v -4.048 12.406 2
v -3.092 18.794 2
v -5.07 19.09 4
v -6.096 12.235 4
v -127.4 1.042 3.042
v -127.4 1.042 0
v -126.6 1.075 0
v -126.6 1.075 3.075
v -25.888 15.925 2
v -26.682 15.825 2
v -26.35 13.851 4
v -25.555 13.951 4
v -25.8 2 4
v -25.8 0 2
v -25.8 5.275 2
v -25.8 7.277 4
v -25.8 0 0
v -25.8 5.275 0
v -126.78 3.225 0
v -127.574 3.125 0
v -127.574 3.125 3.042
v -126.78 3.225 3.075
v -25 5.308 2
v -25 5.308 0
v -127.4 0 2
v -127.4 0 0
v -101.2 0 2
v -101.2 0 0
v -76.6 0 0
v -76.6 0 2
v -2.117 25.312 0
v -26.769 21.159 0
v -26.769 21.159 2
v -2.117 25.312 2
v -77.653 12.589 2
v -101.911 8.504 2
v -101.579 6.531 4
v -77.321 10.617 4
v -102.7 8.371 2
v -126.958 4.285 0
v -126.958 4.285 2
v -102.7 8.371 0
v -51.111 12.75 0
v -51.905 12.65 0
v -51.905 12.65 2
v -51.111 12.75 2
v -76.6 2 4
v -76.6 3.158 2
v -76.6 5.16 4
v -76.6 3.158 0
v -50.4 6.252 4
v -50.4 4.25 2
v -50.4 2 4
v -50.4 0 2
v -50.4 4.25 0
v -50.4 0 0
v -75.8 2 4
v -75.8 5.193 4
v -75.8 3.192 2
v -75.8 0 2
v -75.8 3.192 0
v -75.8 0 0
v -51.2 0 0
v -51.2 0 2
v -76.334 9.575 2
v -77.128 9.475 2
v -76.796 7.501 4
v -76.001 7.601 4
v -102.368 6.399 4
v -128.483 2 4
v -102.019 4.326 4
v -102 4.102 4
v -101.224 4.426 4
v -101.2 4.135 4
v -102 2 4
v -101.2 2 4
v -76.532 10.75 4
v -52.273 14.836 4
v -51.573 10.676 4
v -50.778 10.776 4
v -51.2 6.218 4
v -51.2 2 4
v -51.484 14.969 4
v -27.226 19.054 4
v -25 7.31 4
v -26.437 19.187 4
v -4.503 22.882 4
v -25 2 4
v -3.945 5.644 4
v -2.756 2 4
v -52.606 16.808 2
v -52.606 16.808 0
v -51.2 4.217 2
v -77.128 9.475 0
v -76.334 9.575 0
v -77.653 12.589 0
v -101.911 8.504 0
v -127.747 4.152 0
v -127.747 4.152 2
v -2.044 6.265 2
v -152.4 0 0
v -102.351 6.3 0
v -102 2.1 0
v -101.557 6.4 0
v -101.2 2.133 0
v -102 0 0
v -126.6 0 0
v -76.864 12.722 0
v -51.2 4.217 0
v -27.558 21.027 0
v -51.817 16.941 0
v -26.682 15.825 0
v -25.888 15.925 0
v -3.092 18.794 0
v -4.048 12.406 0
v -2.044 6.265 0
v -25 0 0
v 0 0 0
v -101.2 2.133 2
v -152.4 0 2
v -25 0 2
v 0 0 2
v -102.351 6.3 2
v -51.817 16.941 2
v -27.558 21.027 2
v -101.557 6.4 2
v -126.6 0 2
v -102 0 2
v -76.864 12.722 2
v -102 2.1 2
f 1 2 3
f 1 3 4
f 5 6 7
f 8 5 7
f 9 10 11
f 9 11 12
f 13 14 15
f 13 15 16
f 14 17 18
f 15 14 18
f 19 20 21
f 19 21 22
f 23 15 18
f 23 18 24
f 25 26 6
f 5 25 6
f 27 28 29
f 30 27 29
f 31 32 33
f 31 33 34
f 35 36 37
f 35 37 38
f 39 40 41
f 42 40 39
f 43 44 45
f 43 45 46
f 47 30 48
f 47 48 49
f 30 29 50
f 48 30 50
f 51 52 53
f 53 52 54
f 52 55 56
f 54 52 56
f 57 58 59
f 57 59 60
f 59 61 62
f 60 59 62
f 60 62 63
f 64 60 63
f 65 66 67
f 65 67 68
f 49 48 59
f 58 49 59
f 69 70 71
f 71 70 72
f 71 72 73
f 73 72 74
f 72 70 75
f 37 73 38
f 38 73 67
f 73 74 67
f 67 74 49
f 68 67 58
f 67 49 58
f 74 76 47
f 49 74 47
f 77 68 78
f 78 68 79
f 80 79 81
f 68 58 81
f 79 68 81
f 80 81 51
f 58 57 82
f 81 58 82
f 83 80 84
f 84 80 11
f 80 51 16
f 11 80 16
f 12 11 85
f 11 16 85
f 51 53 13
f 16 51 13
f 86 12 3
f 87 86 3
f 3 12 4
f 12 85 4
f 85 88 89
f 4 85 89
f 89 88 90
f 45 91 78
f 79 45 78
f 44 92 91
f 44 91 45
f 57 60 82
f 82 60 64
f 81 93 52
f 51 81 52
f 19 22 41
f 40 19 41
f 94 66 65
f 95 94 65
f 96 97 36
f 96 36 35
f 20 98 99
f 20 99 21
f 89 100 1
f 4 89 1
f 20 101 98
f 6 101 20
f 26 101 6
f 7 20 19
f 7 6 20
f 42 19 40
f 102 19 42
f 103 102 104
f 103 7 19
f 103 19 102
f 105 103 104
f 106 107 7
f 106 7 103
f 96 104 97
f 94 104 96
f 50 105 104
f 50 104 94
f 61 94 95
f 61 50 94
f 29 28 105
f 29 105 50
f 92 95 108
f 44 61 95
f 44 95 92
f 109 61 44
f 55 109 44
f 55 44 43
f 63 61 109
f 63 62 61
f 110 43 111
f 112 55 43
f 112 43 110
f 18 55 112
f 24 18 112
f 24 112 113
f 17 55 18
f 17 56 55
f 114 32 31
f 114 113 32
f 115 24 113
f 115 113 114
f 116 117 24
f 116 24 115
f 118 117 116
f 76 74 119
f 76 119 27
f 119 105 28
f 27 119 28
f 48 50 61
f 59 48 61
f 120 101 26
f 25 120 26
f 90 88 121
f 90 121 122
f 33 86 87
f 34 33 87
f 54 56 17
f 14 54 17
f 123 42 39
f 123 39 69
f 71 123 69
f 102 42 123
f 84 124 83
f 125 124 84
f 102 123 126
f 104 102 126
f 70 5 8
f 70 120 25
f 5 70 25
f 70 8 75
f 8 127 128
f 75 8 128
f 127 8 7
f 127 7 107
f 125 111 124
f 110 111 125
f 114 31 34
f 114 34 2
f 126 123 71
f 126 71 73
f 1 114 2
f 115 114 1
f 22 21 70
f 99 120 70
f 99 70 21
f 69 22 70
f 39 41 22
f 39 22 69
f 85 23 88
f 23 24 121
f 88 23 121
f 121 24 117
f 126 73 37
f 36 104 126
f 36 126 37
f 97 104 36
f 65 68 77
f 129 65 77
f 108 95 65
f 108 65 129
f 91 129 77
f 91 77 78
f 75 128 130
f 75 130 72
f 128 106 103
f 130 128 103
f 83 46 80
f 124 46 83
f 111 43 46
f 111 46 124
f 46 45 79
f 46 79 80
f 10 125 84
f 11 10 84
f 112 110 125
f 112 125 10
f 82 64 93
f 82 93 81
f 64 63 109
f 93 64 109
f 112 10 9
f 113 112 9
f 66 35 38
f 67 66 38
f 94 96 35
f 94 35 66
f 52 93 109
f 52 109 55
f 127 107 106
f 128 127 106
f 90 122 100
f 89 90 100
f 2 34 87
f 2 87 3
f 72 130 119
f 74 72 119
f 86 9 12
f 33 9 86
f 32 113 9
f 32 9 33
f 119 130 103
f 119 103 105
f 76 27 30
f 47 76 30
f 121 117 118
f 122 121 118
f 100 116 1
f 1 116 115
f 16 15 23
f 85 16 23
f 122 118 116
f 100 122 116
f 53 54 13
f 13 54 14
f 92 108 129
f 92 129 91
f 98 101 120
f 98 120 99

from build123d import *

# Parameters (mm, degrees)
F2_DEPTH    = 4
F3_C1_SIZE  = 2
F3_C2_SIZE  = 2
F3_C3_SIZE  = 2
F3_C4_SIZE  = 2
F3_C5_SIZE  = 2
F3_C6_SIZE  = 2
F3_C7_SIZE  = 2
F3_C8_SIZE  = 2
F3_C9_SIZE  = 2
F3_C10_SIZE = 2


with BuildPart() as f2:
    # F1 (on Top) → F2 (new body)
    with BuildSketch(Plane.XY):
        Polygon((-25, 0), (0, 0), (-2.0441389628, 6.2647895141), (-25, 5.3083011104), align=None)
        Polygon((-25, 5.3083011104), (-2.0441389628, 6.2647895141), (-4.0478985191, 12.4058259531), (-75.8, 6.4056137967), (-75.8, 3.1916472924), (-51.2, 4.2166410704), (-51.2, 7.6929950155), (-50.4, 7.6929950155), (-50.4, 4.2499742014), (-25.8, 5.2749679794), (-25.8, 7.6929950155), (-25, 7.6929950155), align=None)
        Polygon((-50.4, 0), (-25.8, 0), (-25.8, 5.2749679794), (-50.4, 4.2499742014), align=None)
        Polygon((-75.8, 0), (-51.2, 0), (-51.2, 4.2166410704), (-75.8, 3.1916472924), align=None)
        Polygon((-51.2, 4.2166410704), (-50.4, 4.2499742014), (-50.4, 7.6929950155), (-51.2, 7.6929950155), align=None)
        Polygon((-25.8, 5.2749679794), (-25, 5.3083011104), (-25, 7.6929950155), (-25.8, 7.6929950155), align=None)
        Polygon((-76.6, 3.1583141614), (-76.6, 6.3387144359), (-101.2, 4.2815590912), (-101.2, 2.1333203834), align=None)
        Polygon((-75.8, 3.1916472924), (-75.8, 6.4056137967), (-76.6, 6.3387144359), (-76.6, 3.1583141614), align=None)
        Polygon((-76.6, 0), (-76.6, 3.1583141614), (-101.2, 2.1333203834), (-101.2, 0), align=None)
        Polygon((-101.2, 2.1333203834), (-101.2, 4.2815590912), (-102, 4.2146597304), (-102, 2.0999872524), align=None)
        Polygon((-102, 0), (-102, 2.0999872524), (-126.6, 1.0749934745), (-126.6, 0), align=None)
        Polygon((-102, 2.0999872524), (-102, 4.2146597304), (-126.6, 2.1575043858), (-126.6, 1.0749934745), align=None)
        Polygon((-126.6, 1.0749934745), (-126.6, 2.1575043858), (-127.4, 2.090605025), (-127.4, 1.0416603435), align=None)
        Polygon((-127.4, 1.0416603435), (-127.4, 2.090605025), (-152.4, 0), align=None)
        Polygon((-127.4, 1.0416603435), (-152.4, 0), (-127.4, 0), align=None)
    extrude(amount=F2_DEPTH)

    # F3: chamfer of 2 on 11 edges, made by hand

    # F3_c1
    f3_c1_edges = [f2.edges().sort_by_distance(p)[0] for p in [
        (-12.5, 0, 4),
    ]]
    chamfer(f3_c1_edges, length=F3_C1_SIZE)

    # F3_c2
    f3_c2_edges = [f2.edges().sort_by_distance(p)[0] for p in [
        (-2.350239386, 7.2029129766, 4),
    ]]
    chamfer(f3_c2_edges, length=F3_C2_SIZE)

    # F3_c3
    f3_c3_edges = [f2.edges().sort_by_distance(p)[0] for p in [
        (-139.9, 0, 4),
    ]]
    chamfer(f3_c3_edges, length=F3_C3_SIZE)

    # F3_c4
    f3_c4_edges = [f2.edges().sort_by_distance(p)[0] for p in [
        (-101.6, 2.1166538179, 4),
    ]]
    chamfer(f3_c4_edges, length=F3_C4_SIZE)

    # F3_c5
    f3_c5_edges = [f2.edges().sort_by_distance(p)[0] for p in [
        (-88.9, 0, 4),
    ]]
    chamfer(f3_c5_edges, length=F3_C5_SIZE)

    # F3_c6
    f3_c6_edges = [f2.edges().sort_by_distance(p)[0] for p in [
        (-76.2, 3.1749807269, 4),
    ]]
    chamfer(f3_c6_edges, length=F3_C6_SIZE)

    # F3_c7
    f3_c7_edges = [f2.edges().sort_by_distance(p)[0] for p in [
        (-63.5, 0, 4),
    ]]
    chamfer(f3_c7_edges, length=F3_C7_SIZE)

    # F3_c8
    f3_c8_edges = [f2.edges().sort_by_distance(p)[0] for p in [
        (-50.8, 4.2333076359, 4),
    ]]
    chamfer(f3_c8_edges, length=F3_C8_SIZE)

    # F3_c9
    f3_c9_edges = [f2.edges().sort_by_distance(p)[0] for p in [
        (-38.1, 0, 4),
    ]]
    chamfer(f3_c9_edges, length=F3_C9_SIZE)

    # F3_c10
    f3_c10_edges = [f2.edges().sort_by_distance(p)[0] for p in [
        (-25.4, 5.2916345449, 4),
    ]]
    chamfer(f3_c10_edges, length=F3_C10_SIZE)

    # F4: F2 across face


with BuildPart() as f2_1:
    add(f2.part)
    add(f2.part.mirror(Plane(origin=(-75.6988371999, 6.414073455, 1.938990945), x_dir=(-0.9965217286, -0.0833333333, 0), z_dir=(-0.0833333333, 0.9965217286, 0))))


solid = f2_1.part
